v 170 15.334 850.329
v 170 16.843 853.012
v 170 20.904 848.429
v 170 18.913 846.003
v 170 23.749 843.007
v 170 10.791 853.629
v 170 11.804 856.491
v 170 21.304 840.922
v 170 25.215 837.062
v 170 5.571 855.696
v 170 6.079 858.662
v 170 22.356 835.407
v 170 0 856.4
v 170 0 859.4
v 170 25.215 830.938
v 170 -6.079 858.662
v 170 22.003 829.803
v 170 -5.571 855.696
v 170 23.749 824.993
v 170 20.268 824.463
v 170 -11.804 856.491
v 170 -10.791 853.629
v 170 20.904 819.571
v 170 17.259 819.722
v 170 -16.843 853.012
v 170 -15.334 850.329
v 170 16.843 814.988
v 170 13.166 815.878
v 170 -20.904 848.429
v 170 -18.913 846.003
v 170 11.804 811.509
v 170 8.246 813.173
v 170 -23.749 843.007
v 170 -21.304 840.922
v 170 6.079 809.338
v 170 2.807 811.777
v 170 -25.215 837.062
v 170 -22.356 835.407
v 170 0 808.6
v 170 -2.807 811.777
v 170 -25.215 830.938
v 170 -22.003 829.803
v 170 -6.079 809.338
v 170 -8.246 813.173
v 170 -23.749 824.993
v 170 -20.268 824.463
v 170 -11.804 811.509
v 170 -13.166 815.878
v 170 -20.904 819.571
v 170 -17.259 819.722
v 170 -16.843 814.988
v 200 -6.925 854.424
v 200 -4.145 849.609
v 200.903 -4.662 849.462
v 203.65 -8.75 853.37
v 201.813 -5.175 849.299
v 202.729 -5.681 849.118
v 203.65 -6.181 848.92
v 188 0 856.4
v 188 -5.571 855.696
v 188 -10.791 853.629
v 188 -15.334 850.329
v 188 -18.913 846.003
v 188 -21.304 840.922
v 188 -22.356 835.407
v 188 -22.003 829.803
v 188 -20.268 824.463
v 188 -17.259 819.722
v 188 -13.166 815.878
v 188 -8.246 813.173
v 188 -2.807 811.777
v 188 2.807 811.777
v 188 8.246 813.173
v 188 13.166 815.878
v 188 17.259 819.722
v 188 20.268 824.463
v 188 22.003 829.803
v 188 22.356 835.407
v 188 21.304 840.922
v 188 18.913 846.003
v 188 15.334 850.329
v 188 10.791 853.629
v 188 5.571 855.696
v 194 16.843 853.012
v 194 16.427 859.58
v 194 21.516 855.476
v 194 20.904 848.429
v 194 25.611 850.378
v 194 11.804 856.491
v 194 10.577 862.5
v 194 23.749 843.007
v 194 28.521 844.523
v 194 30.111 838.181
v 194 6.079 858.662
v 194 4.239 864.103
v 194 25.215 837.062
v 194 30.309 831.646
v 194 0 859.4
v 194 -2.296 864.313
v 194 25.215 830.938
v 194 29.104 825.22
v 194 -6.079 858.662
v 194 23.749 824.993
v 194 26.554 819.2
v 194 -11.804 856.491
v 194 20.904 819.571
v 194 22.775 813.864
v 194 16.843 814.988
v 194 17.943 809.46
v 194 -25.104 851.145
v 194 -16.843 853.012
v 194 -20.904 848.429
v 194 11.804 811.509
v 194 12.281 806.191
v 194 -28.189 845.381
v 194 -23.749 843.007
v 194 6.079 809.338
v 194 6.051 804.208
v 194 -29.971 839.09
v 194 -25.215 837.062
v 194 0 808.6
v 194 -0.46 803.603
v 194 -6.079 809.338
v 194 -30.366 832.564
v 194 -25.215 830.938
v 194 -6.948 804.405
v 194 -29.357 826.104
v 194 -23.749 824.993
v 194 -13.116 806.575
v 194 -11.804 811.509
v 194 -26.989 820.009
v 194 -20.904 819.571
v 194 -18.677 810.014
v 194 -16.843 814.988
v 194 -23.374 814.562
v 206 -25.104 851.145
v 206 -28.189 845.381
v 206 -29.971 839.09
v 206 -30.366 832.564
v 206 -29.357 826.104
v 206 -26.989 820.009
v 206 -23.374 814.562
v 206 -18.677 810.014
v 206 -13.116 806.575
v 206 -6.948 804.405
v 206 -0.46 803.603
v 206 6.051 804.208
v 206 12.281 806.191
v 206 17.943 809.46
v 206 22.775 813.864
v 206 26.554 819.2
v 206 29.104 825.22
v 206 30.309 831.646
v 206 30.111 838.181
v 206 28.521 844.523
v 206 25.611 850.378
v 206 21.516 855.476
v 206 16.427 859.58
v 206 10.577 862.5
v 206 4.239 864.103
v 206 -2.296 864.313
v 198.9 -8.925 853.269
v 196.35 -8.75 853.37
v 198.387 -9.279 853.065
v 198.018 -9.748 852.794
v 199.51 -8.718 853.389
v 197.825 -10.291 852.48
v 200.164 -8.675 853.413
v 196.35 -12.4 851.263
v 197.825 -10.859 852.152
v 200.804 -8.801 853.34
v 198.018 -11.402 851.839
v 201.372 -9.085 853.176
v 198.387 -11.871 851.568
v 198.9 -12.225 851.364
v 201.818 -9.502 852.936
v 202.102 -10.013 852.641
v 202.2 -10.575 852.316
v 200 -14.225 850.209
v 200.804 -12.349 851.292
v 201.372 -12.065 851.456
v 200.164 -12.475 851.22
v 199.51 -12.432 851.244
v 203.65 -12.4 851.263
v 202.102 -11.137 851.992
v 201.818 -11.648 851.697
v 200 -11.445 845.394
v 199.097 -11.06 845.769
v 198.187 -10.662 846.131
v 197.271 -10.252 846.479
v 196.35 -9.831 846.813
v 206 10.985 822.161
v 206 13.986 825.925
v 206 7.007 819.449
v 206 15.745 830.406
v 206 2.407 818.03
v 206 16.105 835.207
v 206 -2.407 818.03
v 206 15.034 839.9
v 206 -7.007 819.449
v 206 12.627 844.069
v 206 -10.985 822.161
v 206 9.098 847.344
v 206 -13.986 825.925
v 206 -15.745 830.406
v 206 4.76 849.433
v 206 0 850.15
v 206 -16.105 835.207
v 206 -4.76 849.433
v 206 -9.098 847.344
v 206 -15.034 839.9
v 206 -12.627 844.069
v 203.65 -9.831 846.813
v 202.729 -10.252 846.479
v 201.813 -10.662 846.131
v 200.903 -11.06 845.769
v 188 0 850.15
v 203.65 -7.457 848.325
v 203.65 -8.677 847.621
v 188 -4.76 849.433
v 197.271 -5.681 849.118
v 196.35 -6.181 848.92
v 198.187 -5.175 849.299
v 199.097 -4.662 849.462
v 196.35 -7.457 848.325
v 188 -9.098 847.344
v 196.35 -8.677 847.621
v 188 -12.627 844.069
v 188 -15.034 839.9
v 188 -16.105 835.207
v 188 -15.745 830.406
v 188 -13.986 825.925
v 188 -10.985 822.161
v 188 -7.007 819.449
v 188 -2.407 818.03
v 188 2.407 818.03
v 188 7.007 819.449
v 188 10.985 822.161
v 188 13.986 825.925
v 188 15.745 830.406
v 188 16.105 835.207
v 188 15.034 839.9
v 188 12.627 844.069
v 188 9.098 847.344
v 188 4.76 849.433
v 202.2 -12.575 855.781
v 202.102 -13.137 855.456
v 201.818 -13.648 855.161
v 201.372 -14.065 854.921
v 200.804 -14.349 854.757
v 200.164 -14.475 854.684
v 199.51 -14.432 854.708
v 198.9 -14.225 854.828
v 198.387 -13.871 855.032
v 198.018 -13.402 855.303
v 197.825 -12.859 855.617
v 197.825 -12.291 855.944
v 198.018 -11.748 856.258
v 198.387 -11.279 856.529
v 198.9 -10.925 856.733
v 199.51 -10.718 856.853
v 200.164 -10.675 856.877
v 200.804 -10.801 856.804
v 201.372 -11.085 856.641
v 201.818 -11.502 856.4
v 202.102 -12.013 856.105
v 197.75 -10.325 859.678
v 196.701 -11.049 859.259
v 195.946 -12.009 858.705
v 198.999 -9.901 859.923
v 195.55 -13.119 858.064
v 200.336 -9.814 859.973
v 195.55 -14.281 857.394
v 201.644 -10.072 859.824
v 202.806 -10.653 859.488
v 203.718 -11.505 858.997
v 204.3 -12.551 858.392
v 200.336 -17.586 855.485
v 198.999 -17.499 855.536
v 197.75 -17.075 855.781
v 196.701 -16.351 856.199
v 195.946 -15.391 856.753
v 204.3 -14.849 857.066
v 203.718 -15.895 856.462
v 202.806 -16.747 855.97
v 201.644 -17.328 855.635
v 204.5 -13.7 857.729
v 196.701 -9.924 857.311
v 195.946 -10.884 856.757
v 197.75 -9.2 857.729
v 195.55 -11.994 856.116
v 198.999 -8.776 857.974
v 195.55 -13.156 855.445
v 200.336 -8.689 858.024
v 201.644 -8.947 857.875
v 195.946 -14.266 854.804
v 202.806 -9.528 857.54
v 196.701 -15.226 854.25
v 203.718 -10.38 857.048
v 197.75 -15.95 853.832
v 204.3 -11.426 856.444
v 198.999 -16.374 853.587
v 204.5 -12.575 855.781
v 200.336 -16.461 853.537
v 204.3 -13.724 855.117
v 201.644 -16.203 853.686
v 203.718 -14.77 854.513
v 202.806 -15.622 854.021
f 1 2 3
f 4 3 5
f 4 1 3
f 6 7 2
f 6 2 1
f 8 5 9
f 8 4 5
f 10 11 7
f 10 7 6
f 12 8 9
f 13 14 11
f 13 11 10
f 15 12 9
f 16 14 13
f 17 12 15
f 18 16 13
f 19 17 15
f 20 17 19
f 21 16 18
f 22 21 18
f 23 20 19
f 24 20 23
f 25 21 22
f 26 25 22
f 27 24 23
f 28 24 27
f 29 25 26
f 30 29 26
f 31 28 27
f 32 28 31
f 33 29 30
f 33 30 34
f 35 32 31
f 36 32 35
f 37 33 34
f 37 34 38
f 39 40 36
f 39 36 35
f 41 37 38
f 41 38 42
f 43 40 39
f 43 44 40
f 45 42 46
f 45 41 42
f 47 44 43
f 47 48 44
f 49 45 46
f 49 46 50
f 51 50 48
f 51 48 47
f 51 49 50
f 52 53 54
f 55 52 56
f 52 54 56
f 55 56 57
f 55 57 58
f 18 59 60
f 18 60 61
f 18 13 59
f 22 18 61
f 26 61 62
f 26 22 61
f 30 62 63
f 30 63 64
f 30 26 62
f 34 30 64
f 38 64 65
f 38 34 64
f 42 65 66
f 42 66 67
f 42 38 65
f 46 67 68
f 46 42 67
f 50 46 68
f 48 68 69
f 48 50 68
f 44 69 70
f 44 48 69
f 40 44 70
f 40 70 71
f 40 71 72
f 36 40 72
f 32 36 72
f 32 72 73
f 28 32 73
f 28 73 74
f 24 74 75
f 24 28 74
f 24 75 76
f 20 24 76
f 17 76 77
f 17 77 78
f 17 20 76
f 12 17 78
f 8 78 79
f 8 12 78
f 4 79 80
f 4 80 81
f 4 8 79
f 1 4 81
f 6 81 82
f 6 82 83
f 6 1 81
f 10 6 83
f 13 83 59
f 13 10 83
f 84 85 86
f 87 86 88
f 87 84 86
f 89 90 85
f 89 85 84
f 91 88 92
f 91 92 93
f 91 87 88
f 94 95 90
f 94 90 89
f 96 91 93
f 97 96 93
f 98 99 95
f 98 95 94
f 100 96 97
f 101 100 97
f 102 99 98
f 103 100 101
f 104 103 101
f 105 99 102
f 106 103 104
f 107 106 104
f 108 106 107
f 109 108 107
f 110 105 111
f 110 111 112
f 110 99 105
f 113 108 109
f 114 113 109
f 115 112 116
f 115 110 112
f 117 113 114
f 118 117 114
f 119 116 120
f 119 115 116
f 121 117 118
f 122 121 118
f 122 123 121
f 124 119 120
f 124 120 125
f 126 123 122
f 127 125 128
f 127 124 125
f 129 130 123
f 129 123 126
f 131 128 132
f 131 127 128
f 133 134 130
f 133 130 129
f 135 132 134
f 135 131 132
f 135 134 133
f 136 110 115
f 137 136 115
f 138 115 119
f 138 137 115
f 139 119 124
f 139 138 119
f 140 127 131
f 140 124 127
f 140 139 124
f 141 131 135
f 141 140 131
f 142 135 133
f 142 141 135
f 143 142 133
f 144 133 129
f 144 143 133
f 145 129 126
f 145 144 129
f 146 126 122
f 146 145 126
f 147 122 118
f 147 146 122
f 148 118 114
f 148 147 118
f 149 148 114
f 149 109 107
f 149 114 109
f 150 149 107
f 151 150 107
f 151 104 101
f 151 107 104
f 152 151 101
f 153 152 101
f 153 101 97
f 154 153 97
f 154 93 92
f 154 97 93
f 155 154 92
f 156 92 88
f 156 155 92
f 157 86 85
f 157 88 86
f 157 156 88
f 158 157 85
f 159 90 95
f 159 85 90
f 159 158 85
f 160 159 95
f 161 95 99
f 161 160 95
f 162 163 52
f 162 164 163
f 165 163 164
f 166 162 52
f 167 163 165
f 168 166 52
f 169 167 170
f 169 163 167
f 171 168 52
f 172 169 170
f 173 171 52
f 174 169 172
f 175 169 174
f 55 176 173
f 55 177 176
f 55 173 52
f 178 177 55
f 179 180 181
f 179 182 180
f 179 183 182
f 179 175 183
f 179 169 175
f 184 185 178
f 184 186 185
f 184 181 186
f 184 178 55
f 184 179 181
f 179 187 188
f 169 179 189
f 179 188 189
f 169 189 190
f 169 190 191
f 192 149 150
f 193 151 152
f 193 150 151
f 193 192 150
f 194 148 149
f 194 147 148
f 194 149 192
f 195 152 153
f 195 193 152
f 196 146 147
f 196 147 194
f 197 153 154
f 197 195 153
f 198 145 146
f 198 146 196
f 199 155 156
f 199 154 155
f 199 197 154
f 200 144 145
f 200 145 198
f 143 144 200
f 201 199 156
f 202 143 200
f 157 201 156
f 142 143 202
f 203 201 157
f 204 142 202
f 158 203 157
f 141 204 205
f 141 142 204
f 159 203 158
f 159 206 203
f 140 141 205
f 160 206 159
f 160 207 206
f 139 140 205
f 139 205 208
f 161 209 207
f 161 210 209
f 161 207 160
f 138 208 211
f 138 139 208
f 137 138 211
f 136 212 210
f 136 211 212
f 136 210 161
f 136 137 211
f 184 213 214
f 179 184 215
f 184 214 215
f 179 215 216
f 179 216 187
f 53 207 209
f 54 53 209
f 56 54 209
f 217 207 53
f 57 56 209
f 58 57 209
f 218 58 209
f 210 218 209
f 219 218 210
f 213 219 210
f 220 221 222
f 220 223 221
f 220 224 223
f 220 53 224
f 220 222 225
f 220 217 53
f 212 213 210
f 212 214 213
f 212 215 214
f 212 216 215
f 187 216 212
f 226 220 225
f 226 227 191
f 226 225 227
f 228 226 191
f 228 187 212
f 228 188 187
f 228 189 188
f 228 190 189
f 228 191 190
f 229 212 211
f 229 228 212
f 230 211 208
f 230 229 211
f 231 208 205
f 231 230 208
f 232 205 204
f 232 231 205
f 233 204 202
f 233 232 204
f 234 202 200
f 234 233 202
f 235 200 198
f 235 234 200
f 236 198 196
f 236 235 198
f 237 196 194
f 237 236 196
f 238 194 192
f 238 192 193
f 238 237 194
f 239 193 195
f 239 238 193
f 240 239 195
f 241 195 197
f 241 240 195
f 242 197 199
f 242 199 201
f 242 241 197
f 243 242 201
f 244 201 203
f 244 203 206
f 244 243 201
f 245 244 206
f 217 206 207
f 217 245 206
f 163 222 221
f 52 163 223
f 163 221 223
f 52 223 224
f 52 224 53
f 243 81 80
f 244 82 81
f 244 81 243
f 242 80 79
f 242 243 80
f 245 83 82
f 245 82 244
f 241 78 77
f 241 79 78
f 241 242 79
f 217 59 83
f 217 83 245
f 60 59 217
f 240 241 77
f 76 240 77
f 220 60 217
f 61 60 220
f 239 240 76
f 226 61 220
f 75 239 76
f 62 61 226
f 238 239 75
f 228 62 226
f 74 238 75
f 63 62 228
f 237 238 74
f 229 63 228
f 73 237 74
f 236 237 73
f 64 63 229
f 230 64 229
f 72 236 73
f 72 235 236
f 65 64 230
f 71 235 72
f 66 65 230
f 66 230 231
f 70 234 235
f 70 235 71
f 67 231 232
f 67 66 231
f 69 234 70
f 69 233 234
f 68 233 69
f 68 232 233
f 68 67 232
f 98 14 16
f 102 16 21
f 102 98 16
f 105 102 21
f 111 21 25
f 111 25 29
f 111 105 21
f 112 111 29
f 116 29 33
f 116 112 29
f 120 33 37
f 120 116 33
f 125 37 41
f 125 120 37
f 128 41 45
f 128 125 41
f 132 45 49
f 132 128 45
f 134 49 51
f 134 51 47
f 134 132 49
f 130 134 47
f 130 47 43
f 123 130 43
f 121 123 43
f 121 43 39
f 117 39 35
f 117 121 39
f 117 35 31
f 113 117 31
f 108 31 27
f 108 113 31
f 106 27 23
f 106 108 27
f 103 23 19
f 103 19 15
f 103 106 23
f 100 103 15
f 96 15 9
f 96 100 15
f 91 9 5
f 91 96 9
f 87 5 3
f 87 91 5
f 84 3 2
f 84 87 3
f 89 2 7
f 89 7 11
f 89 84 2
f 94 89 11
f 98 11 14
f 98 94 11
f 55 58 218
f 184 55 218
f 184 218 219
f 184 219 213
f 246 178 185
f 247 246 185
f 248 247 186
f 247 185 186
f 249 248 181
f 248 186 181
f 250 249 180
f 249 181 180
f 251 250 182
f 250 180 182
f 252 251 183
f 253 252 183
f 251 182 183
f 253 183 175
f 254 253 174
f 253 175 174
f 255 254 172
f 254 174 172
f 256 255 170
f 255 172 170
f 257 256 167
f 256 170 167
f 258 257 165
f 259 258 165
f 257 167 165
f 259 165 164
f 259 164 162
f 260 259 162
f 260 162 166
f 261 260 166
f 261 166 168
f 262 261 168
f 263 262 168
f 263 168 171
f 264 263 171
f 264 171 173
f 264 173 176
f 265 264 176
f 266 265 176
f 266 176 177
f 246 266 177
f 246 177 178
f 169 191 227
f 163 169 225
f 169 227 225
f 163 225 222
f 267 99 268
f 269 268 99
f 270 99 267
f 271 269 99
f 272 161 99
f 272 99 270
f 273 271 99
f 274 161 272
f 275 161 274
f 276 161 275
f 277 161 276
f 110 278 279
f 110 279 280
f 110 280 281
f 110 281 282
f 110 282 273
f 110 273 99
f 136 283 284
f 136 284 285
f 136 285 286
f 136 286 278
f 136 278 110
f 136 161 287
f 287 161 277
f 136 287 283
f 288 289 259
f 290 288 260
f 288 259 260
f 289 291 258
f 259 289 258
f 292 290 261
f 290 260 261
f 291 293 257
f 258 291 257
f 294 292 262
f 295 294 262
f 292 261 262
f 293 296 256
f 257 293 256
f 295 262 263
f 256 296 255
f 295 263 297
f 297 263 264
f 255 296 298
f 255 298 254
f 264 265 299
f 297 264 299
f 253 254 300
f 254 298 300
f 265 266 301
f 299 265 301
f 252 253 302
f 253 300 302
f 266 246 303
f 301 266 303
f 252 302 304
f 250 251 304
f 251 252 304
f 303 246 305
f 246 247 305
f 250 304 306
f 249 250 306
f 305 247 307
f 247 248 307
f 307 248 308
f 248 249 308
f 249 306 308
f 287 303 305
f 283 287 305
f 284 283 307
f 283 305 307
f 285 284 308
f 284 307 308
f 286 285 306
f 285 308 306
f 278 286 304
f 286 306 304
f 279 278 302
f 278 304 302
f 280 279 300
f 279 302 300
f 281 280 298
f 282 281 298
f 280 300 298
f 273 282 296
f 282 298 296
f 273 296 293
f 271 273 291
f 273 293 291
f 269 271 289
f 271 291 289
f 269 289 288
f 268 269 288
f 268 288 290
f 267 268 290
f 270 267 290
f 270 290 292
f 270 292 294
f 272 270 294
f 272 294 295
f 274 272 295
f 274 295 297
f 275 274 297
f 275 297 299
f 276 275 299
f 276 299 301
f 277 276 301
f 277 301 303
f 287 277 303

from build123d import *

# Parameters (mm, degrees)
SKETCH147_W          = 50.8
SKETCH147_H          = 7
POCKET092_DEPTH      = 30.001
POCKET092_DEPTH_BACK = 6.001
SKETCH144_R          = 2.2
POCKET093_DEPTH      = 41.528172
POCKET094_DEPTH      = 21.15
SKETCH148_R          = 4.5
POCKET095_DEPTH      = 5


with BuildPart() as part:
    # Sketch143 → Revolution004 (revolve)
    with BuildSketch(Plane.XZ):
        Polygon((0, 25.4), (0, 30.4), (12, 30.4), (12, 16.15), (-6, 16.15), (-6, 22.4), (-24, 22.4), (-24, 25.4), align=None)
    revolve(axis=Axis((0, 0, 0), (1, 0, 0)))

    # Sketch147 (on DatumPlane) → Pocket092 (cut, two sides)
    with BuildSketch(Plane(origin=(6, 0, 0), x_dir=(0, -0.866025, -0.5), z_dir=(1, 0, 0))) as pocket092_sk:
        with Locations((0, -30.9)):
            Rectangle(SKETCH147_W, SKETCH147_H)
    extrude(amount=-POCKET092_DEPTH, mode=Mode.SUBTRACT)
    extrude(pocket092_sk.sketch, amount=POCKET092_DEPTH_BACK, mode=Mode.SUBTRACT)

    # Sketch144 (on DatumPlane) → Pocket093 (cut, through all)
    with BuildSketch(Plane(origin=(6, 0, 0), x_dir=(1, 0, 0), z_dir=(0, 0.5, -0.866025))):
        Circle(SKETCH144_R)
    extrude(amount=-POCKET093_DEPTH, mode=Mode.SUBTRACT)

    # Sketch145 (on DatumPlane) → Pocket094 (cut)
    with BuildSketch(Plane(origin=(6, 0, 0), x_dir=(1, 0, 0), z_dir=(0, 0.5, -0.866025))):
        Polygon((3.65, -2.107328), (3.65, 2.107328), (0, 4.214657), (-3.65, 2.107328), (-3.65, -2.107328), (0, -4.214657), align=None)
    extrude(amount=-POCKET094_DEPTH, mode=Mode.SUBTRACT)

    # Sketch148 (on DatumPlane) → Pocket095 (cut)
    with BuildSketch(Plane(origin=(6, -12.575, 21.780539), x_dir=(1, 0, 0), z_dir=(0, 0.5, -0.866025))):
        Circle(SKETCH148_R)
    extrude(amount=-POCKET095_DEPTH, mode=Mode.SUBTRACT)


with BuildPart() as part_1:
    # Body022029 placement: moved
    add(part.part.moved(Location((194, 0, 834))))


solid = part_1.part
